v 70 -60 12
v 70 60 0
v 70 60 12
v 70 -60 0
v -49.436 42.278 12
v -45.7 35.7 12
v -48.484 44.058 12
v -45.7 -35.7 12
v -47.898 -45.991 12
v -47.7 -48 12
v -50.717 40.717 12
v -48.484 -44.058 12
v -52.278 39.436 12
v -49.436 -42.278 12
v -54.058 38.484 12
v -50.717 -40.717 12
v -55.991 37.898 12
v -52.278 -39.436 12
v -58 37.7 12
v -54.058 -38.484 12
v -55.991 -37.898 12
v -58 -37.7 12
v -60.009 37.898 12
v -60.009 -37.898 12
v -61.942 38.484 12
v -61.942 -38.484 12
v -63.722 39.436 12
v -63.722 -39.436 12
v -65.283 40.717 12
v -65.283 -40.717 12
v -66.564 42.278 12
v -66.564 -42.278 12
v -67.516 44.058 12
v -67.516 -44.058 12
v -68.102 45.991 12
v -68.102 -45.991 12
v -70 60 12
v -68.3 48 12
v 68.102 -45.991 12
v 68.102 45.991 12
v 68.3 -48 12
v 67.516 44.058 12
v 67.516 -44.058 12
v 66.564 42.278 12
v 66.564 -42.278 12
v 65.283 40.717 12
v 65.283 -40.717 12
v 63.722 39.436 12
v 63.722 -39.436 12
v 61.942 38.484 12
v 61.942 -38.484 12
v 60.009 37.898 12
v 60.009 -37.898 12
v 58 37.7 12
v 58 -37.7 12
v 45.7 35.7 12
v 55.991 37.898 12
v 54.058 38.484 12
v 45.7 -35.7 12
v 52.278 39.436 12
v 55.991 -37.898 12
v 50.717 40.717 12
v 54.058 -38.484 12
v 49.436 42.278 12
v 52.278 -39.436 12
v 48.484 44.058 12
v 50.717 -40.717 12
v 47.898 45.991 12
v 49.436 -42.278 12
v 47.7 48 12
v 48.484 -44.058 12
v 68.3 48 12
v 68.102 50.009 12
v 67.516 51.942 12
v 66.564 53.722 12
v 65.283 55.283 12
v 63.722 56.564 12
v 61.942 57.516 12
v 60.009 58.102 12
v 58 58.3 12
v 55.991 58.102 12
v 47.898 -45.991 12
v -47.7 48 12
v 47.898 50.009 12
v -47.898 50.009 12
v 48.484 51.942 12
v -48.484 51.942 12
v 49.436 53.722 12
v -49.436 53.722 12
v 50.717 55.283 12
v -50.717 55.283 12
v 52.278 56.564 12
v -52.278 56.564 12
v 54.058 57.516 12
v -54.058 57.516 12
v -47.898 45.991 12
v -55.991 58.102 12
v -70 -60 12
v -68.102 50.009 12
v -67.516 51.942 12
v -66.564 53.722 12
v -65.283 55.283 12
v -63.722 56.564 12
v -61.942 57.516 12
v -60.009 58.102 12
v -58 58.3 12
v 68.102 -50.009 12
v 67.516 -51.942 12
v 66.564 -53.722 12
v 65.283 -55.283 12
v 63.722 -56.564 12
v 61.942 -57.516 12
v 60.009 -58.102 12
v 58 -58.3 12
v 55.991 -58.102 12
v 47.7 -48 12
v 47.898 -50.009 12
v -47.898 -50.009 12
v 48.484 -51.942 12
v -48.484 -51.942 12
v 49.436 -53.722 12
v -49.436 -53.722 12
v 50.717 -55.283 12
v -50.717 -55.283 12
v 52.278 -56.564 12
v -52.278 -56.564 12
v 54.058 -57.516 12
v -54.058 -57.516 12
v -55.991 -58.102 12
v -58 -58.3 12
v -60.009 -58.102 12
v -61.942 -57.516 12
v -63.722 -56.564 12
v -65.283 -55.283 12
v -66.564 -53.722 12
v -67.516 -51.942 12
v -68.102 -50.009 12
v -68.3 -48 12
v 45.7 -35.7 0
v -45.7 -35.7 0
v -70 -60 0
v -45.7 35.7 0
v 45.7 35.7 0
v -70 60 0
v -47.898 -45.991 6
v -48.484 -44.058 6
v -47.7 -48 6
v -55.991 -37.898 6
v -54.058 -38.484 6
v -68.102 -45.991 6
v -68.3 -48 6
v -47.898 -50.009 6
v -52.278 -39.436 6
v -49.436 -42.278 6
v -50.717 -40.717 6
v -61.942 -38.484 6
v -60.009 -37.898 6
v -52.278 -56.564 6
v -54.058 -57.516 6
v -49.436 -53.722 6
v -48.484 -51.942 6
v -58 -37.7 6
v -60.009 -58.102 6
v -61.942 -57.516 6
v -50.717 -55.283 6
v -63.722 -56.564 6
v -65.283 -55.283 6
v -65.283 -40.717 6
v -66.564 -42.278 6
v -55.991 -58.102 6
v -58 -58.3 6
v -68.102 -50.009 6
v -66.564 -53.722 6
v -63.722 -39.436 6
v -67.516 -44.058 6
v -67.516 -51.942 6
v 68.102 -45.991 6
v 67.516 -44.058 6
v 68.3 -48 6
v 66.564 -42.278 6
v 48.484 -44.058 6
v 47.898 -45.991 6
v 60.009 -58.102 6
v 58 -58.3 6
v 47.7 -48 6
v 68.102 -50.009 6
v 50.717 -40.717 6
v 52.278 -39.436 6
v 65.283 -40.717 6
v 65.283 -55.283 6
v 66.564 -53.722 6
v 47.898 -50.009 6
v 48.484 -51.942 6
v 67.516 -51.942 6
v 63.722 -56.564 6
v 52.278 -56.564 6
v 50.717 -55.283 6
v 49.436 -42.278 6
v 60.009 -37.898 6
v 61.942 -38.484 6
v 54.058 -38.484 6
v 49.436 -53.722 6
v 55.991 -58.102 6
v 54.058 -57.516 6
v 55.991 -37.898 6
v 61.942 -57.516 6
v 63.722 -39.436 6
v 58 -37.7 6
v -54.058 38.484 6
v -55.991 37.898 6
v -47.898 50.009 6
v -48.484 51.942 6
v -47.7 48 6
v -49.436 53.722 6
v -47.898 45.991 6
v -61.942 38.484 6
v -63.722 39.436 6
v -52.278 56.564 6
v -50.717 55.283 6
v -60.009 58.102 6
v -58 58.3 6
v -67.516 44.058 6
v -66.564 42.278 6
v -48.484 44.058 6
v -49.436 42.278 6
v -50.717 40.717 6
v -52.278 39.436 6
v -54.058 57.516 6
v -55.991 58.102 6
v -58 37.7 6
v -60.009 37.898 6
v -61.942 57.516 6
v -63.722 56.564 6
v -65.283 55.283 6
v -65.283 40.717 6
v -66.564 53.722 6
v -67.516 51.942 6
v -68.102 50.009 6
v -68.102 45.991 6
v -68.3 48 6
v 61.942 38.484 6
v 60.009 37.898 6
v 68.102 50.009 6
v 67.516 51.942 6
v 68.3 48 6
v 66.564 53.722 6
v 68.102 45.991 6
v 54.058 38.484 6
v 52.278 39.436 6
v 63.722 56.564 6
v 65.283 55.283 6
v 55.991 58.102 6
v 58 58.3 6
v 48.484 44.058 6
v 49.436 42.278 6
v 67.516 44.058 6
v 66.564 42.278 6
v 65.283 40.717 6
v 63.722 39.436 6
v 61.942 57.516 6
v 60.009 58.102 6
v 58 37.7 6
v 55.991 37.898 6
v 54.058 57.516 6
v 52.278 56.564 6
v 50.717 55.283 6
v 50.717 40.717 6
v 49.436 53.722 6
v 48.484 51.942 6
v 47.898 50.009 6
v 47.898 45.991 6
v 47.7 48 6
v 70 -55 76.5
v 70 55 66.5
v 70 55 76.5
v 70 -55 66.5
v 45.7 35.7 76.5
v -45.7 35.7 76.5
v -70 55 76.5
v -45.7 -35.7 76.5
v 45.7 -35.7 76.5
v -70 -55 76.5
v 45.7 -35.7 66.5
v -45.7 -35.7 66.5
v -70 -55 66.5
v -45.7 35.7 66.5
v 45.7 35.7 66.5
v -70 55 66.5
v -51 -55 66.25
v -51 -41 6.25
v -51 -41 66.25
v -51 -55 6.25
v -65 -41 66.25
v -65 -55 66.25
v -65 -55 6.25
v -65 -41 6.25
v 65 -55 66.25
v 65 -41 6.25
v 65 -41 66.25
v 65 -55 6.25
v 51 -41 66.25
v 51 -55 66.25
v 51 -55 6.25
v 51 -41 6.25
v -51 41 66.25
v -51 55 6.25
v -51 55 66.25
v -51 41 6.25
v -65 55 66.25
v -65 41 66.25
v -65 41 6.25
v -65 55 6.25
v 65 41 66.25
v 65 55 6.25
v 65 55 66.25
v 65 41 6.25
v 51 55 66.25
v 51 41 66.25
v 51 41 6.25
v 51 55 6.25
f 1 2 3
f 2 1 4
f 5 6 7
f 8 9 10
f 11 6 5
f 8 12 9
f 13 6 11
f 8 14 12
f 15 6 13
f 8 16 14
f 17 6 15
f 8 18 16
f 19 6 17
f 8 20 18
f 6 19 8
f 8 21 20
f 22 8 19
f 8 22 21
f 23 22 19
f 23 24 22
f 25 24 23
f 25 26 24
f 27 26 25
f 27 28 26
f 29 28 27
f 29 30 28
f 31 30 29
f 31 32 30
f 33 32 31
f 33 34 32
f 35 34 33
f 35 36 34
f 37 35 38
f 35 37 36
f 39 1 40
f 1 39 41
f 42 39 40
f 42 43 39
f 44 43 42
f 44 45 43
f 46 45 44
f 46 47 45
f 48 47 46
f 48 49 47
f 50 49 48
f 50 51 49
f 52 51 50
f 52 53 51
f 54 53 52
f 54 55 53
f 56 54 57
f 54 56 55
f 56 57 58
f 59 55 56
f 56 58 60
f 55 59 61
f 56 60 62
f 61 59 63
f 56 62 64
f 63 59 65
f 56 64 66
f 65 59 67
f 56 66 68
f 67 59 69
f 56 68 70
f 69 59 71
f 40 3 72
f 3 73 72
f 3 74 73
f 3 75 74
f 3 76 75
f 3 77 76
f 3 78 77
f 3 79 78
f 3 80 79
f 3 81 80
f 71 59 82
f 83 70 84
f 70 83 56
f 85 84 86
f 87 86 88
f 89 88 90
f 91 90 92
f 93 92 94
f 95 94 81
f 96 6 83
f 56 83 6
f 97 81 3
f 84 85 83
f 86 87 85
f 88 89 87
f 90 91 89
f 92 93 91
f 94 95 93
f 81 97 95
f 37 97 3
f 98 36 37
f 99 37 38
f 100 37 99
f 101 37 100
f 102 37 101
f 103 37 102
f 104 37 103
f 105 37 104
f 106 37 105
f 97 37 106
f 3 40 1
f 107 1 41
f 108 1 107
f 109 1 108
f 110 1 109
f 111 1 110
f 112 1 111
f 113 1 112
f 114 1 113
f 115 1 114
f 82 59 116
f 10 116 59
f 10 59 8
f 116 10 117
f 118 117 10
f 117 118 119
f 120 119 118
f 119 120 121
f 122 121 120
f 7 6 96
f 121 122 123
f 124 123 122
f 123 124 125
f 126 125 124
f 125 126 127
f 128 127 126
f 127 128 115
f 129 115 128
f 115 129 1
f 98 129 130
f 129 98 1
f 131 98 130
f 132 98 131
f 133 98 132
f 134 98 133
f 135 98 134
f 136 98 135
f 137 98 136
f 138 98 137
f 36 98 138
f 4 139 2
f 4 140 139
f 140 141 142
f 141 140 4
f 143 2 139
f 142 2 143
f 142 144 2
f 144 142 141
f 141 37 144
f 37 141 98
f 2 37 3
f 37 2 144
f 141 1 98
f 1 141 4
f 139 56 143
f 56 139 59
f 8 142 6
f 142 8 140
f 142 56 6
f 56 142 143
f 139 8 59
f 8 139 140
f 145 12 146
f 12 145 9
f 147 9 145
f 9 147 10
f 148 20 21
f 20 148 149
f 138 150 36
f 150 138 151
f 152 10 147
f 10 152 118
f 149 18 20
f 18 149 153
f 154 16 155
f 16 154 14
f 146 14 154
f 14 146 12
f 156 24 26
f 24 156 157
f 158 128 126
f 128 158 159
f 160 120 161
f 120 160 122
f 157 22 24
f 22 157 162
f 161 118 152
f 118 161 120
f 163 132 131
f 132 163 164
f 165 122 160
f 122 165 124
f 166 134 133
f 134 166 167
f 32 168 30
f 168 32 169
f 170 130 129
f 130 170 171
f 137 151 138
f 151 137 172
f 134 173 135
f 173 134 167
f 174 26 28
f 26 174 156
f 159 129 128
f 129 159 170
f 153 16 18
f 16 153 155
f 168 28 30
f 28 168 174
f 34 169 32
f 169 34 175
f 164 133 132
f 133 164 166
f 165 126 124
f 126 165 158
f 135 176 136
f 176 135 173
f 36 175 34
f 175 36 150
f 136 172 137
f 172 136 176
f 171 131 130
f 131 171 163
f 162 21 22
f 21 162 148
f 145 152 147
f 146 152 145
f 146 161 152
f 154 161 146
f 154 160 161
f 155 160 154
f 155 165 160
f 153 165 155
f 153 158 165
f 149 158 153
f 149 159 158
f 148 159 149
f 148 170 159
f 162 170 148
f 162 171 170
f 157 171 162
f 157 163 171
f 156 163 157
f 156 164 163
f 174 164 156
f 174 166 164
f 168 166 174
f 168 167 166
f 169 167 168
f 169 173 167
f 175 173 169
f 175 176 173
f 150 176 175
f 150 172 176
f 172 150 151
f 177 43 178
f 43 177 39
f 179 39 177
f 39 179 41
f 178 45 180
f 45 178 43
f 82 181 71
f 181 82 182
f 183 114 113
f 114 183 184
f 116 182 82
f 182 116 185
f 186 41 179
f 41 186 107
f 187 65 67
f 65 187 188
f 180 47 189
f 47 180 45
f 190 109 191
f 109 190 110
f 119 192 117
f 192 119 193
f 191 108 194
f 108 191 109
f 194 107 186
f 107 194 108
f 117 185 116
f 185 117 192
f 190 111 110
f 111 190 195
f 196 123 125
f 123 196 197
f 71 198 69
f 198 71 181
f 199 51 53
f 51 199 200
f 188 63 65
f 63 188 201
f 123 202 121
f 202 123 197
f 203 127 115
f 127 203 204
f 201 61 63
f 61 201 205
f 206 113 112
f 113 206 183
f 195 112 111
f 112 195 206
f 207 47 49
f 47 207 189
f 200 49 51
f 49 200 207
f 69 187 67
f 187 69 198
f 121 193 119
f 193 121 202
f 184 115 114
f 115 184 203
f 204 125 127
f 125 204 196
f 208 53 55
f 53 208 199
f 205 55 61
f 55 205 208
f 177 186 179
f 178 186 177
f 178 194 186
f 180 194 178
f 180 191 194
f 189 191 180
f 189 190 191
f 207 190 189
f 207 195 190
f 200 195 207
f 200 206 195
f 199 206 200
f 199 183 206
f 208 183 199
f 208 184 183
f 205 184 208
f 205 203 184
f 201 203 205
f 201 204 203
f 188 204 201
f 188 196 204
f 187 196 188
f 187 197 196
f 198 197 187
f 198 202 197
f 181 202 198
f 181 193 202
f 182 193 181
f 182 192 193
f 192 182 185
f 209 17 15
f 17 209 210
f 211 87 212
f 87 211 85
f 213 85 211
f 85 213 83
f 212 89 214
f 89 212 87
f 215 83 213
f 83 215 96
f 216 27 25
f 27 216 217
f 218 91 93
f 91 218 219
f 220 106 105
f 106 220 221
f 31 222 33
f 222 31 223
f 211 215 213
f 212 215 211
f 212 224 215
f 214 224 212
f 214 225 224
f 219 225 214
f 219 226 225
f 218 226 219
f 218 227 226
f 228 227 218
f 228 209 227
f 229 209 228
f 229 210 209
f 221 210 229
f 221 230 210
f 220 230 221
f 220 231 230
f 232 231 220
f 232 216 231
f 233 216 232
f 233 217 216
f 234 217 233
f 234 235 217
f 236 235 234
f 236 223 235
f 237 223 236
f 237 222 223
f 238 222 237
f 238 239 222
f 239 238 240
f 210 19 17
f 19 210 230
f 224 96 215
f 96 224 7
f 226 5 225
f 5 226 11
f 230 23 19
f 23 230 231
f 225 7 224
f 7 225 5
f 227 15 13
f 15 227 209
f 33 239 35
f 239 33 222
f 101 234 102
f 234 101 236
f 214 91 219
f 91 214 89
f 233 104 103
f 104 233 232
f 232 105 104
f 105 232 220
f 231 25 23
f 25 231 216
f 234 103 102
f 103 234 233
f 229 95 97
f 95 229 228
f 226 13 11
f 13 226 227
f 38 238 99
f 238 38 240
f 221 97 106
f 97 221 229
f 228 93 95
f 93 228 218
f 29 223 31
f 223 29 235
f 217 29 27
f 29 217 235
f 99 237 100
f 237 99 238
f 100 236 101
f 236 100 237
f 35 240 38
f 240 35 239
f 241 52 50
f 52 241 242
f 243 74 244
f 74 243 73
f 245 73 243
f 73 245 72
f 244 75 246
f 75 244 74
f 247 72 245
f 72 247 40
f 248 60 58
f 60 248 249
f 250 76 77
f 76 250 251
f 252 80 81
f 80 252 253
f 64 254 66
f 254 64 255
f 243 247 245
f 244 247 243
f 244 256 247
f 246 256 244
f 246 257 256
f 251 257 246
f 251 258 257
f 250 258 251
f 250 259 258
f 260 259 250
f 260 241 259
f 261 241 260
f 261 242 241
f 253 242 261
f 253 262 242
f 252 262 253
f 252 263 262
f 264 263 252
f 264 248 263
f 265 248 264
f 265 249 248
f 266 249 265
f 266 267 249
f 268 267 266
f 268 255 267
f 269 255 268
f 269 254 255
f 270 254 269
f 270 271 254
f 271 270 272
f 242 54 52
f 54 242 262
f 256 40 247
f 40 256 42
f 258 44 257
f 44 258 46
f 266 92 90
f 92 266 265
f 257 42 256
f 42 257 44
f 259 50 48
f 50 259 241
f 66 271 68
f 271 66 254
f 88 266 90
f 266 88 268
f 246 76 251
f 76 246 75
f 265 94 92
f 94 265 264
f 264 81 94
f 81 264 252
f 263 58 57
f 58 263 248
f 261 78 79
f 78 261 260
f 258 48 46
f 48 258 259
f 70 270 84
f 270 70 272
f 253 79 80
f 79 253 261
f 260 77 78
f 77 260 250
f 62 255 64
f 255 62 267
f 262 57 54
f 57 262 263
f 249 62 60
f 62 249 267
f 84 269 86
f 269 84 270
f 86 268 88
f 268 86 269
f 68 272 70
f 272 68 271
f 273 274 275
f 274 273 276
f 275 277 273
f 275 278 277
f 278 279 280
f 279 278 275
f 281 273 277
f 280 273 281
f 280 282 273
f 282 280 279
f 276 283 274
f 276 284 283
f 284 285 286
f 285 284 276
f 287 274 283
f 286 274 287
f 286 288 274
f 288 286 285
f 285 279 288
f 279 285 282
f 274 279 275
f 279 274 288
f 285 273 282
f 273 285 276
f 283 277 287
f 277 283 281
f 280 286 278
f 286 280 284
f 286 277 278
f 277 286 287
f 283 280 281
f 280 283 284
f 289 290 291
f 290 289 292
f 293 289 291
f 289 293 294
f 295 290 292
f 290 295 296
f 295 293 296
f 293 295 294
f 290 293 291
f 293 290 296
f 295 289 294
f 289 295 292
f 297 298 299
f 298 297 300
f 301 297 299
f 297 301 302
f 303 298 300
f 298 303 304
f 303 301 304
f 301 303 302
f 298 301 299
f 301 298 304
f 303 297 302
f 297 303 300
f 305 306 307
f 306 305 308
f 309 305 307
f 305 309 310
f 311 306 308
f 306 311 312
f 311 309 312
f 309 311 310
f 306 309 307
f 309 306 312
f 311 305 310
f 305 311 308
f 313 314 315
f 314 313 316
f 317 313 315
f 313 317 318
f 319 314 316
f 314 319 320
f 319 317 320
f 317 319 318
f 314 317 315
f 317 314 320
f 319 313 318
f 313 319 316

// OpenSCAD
$fn = 32;

// ------------------------------------------------------------------------
// Frame cube: base 140 x 120 mm, posts 60 mm tall
// Every part is its own module, assembly() places every instance.
// ------------------------------------------------------------------------

// --- part 1 ---
module base_frame() {
  difference() {
    translate([-70, -60, 0]) cube([140, 120, 12]);
    translate([-45.7, -35.7, -1]) cube([91.4, 71.4, 14]);
    translate([-58, -48, 6]) cylinder(h = 7, d = 20.6);
    translate([58, -48, 6]) cylinder(h = 7, d = 20.6);
    translate([-58, 48, 6]) cylinder(h = 7, d = 20.6);
    translate([58, 48, 6]) cylinder(h = 7, d = 20.6);
  }
}

// --- part 2 ---
module corner_post() {
  translate([-7, -7, 0]) cube([14, 14, 60]);
}

// --- part 3 ---
module top_frame() {
  difference() {
    translate([-70, -55, 0]) cube([140, 110, 10]);
    translate([-45.7, -35.7, -1]) cube([91.4, 71.4, 12]);
  }
}

// --- assembly ---
module assembly() {
  color([0.80, 0.24, 0.20]) translate([0, 0, 0]) rotate([0, 0, 0]) base_frame();
  color([0.20, 0.45, 0.75]) translate([-58, -48, 6.25]) rotate([0, 0, 0]) corner_post();
  color([0.25, 0.62, 0.32]) translate([58, -48, 6.25]) rotate([0, 0, 0]) corner_post();
  color([0.92, 0.70, 0.18]) translate([-58, 48, 6.25]) rotate([0, 0, 0]) corner_post();
  color([0.58, 0.35, 0.70]) translate([58, 48, 6.25]) rotate([0, 0, 0]) corner_post();
  color([0.16, 0.66, 0.66]) translate([0, 0, 66.5]) rotate([0, 0, 0]) top_frame();
}

assembly();
